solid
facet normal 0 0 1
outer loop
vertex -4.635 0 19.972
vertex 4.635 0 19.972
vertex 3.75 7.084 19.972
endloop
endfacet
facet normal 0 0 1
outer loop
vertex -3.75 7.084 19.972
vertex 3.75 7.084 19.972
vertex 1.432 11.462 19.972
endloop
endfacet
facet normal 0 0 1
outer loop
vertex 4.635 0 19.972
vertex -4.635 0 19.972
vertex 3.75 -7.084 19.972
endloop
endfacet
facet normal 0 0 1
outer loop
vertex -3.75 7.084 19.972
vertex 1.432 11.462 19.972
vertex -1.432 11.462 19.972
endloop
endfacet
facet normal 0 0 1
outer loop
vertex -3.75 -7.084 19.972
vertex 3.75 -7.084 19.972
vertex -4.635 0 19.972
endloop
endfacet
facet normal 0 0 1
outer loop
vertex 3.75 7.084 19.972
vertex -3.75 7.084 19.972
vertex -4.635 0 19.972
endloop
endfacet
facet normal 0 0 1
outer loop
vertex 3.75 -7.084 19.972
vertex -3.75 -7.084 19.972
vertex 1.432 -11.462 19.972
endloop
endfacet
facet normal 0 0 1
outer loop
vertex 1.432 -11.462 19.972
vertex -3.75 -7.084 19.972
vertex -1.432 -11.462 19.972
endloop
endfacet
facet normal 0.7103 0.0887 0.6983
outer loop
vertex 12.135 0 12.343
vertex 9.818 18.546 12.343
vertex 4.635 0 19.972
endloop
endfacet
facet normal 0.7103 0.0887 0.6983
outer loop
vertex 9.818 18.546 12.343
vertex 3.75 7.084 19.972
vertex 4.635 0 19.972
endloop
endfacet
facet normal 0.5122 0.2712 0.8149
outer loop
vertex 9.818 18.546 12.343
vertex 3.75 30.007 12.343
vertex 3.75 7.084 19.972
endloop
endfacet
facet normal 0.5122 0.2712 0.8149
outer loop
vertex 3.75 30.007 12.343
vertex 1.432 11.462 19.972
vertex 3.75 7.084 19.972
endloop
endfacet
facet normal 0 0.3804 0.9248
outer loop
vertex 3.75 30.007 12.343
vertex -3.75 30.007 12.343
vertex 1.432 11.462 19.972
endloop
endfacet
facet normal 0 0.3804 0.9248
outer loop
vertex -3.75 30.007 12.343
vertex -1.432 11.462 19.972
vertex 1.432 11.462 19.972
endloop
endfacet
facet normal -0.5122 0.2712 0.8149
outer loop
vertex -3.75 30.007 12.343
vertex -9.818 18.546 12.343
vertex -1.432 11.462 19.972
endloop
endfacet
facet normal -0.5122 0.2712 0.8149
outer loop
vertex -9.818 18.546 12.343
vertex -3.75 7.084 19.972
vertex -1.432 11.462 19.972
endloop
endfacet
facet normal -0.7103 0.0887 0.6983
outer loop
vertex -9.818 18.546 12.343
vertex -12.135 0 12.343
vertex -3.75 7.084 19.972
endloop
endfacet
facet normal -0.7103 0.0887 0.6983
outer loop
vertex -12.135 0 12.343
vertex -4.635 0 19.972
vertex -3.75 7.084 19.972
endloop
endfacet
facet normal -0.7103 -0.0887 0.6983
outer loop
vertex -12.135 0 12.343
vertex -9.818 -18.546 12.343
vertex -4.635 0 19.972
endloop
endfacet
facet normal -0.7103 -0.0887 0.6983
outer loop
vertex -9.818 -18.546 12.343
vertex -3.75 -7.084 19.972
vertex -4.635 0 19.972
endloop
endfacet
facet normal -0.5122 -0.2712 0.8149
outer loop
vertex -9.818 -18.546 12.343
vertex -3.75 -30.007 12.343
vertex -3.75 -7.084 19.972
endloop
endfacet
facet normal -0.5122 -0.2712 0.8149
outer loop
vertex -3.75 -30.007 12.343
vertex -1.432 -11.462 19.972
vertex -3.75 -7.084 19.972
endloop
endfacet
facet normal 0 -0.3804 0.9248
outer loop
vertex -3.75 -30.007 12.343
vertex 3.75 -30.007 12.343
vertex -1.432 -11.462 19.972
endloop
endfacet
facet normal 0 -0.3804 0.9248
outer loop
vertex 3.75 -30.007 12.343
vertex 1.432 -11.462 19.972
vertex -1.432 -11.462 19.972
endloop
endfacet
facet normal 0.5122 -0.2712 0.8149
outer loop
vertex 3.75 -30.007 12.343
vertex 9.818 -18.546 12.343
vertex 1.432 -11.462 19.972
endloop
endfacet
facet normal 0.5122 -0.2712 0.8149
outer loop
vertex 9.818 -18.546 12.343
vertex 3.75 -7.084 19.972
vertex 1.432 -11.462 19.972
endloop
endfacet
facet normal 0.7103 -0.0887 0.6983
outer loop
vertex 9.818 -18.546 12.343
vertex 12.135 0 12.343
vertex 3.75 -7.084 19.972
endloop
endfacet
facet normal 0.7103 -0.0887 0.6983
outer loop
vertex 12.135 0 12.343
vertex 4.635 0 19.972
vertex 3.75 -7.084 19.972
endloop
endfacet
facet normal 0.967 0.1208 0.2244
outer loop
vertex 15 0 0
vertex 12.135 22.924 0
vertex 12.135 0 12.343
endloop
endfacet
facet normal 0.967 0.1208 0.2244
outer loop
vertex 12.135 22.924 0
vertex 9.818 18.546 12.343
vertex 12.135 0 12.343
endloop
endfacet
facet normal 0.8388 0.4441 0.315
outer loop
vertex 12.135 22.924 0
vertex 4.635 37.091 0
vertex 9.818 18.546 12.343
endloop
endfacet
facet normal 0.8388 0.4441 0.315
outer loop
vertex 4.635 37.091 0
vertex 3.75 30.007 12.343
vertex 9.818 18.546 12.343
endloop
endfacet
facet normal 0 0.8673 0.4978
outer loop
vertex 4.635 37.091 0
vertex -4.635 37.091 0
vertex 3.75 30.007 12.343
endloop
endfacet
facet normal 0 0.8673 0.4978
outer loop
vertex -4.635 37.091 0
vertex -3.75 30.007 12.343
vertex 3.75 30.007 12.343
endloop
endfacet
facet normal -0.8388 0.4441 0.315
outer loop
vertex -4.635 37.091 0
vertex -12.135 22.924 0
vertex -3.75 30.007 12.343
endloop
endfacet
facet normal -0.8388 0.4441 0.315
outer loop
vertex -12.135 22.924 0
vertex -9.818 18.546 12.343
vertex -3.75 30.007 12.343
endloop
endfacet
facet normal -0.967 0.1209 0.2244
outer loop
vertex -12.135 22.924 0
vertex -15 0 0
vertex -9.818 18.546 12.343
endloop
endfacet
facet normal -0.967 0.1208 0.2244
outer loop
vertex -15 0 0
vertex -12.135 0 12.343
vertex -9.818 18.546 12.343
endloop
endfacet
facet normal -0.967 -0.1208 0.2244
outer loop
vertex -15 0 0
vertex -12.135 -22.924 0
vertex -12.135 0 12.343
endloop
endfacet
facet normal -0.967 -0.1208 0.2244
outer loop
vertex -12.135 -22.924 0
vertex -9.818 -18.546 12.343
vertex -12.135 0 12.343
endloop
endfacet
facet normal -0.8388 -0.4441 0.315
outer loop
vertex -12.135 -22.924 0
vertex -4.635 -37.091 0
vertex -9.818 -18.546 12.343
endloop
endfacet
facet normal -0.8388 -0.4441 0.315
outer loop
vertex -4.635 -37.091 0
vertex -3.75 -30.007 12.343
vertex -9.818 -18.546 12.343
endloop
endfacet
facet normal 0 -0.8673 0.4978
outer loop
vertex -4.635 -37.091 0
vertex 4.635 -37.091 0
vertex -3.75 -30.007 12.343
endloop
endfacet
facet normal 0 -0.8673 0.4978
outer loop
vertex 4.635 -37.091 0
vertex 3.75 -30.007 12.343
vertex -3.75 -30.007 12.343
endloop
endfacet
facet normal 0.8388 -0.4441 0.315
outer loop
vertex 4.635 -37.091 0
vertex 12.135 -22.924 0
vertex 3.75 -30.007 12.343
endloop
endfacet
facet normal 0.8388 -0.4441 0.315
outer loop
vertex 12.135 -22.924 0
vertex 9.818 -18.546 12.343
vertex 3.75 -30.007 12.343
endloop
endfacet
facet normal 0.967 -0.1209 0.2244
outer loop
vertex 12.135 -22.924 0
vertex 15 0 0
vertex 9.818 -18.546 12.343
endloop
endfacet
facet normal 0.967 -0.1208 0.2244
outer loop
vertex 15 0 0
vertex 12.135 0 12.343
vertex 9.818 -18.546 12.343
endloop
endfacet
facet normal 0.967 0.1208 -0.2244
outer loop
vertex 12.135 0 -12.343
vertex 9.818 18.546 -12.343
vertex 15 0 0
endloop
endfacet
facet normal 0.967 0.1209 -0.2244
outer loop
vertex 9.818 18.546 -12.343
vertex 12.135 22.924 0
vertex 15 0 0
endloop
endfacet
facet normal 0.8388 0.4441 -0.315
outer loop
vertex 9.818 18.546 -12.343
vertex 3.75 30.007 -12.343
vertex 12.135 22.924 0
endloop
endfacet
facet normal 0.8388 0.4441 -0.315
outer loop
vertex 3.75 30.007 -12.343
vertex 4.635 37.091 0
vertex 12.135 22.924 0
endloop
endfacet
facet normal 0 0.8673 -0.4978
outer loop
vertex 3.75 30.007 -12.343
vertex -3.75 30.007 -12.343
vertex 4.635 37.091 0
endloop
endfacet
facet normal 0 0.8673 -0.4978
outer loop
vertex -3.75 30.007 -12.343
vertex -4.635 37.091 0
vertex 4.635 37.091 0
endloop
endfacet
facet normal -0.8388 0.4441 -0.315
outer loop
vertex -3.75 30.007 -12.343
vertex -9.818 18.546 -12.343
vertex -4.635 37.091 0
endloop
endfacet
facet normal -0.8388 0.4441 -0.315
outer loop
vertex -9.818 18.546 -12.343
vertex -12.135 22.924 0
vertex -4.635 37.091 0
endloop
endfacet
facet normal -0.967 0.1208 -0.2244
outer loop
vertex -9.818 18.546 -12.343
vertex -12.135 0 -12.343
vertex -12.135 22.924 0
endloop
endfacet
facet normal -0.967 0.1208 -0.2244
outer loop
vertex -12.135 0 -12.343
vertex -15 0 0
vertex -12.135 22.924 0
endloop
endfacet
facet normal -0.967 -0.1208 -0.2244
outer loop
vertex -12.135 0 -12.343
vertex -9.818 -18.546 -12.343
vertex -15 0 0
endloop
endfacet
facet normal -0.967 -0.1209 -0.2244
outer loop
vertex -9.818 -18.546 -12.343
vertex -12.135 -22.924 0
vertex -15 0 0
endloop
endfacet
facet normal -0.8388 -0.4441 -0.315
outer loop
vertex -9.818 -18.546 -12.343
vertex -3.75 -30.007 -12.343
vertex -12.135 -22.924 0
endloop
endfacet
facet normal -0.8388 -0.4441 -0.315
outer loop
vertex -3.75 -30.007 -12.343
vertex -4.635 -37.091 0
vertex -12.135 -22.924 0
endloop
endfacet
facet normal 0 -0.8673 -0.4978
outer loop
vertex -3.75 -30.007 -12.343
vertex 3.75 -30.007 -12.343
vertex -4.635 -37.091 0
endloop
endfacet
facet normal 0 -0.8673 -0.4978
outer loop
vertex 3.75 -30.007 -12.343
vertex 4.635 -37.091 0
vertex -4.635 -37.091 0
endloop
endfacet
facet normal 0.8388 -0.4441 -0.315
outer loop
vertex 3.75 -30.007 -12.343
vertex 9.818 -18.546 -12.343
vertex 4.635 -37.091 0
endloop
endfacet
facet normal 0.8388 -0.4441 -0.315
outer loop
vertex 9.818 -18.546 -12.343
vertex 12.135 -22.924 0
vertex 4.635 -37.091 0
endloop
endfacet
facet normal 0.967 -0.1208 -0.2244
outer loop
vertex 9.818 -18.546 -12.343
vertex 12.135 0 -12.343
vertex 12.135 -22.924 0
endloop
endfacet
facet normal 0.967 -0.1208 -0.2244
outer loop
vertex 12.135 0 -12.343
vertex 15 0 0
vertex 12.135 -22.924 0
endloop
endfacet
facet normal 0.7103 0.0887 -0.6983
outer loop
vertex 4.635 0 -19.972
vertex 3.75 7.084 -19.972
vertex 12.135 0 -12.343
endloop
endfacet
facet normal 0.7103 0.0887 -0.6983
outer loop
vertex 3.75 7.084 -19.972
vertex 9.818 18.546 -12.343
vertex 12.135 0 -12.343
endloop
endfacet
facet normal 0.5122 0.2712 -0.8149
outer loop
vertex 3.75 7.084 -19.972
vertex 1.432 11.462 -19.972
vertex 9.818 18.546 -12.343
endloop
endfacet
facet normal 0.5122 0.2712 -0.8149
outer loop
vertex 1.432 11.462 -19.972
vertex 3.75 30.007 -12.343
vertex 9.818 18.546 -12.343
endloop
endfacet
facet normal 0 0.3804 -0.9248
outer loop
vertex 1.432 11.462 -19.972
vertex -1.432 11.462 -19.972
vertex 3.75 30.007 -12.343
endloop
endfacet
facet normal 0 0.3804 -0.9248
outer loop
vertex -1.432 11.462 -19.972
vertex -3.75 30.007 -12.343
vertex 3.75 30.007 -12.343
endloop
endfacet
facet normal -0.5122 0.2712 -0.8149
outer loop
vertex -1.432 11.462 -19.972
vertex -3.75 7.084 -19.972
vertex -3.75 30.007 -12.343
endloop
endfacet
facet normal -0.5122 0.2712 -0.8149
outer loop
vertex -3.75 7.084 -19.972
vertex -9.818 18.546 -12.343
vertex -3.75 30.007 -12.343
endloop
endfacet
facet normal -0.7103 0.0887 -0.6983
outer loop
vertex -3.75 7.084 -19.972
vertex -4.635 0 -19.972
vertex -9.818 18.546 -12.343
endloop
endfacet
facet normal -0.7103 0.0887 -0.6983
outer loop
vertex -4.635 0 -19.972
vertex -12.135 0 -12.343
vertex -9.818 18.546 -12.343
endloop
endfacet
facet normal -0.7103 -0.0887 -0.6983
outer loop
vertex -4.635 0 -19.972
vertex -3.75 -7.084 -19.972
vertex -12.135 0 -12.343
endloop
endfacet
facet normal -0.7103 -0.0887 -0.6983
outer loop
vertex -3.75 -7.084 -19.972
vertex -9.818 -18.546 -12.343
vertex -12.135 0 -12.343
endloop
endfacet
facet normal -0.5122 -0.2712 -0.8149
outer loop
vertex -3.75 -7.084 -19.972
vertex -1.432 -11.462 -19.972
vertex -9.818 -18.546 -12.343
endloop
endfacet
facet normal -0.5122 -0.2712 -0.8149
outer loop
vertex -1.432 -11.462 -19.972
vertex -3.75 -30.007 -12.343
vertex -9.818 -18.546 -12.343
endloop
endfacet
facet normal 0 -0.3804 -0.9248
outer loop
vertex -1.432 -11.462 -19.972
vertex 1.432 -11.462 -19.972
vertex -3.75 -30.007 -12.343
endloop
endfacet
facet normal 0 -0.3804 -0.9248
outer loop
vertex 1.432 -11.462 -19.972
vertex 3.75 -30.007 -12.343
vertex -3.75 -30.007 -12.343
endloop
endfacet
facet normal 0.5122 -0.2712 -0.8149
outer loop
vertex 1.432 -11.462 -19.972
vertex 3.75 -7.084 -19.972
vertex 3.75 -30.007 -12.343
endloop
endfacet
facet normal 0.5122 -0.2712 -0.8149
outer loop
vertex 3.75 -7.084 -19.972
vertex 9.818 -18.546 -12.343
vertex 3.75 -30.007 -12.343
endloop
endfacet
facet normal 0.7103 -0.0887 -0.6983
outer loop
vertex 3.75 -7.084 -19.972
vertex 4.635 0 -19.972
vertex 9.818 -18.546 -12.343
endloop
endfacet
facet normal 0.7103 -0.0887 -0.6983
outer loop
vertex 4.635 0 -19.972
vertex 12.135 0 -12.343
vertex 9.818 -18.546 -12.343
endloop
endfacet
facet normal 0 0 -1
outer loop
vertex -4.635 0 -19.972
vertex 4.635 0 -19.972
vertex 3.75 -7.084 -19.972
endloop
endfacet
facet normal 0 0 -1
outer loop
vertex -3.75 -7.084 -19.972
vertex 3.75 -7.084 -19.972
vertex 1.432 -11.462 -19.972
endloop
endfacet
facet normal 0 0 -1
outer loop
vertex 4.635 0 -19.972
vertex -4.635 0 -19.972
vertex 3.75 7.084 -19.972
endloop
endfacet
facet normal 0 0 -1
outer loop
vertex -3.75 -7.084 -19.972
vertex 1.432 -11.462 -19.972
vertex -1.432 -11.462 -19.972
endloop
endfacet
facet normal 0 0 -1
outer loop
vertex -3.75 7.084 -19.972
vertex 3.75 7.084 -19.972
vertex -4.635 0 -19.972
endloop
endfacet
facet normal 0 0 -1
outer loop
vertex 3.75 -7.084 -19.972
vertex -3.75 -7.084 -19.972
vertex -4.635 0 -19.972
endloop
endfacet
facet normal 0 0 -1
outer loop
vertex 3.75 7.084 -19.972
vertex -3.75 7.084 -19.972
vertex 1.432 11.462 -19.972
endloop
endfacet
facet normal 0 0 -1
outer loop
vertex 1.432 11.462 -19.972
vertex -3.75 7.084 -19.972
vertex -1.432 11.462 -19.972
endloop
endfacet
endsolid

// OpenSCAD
// Generated by SolidPython 1.0.1 on 2020-07-29 00:46:46


scale(v = [5, 13, 7]) {
	sphere(r = 3);
}
/***********************************************
*********      SolidPython code:      **********
************************************************
 
# import packages: SolidPython
from solid import *
from solid.utils import *
from itertools import chain, combinations, permutations


class Resize:

    def __init__(self, scad_file):
        self.scad_file = scad_file
        #self.scad_file = import_scad(scad_file)
        # cone/cylinder param:
        self.r1 = 0
        self.r2 = 0
        self.h = 0
        # rectangular prism param:
        self.w = 0
        self.l = 0
        # ellipse param:
        self.r = 0

    # import OpenScad code (file name corresponds to shape)


    # classify shape + parameters
    def assign(self, param1, param2, param3):
        if self.scad_file == 'cone.scad':
            self.r1 = param1
            self.r2 = param2
            self.h = param3
        elif self.scad_file == 'cylinder.scad':
            self.r1 = param1
            self.r2 = param2
            self.h = param3
        elif self.scad_file == 'rectangularPrism.scad':
            self.h = param1
            self.l = param2
            self.w = param3
        else:
            self.r = param1
            self.h = param2

    # resize parameters
    def iterate(self):
        x = range(3, 20, 2)
        i = 1
        if self.scad_file == 'cone.scad':
            tempList = list(permutations(x, 2))
            for temp in tempList:
                param1 = temp[0]
                param2 = temp[1]
                filepath = 'produced_scad_files/' + 'cone' + str(param1) + '_' + str(param2) + '_' + '.scad'
                scad_render_to_file(cylinder(h=param1, r1=param2, r2=0), filepath)

        elif self.scad_file == 'cylinder.scad':
            tempList = list(permutations(x, 3))
            for temp in tempList:
                param1 = temp[0]
                param2 = temp[1]
                filepath = 'produced_scad_files/' + 'cylinder' + str(param1) + '_' + str(param2) + '_' + '.scad'
                scad_render_to_file(cylinder(h=param1, r1=param2, r2=param2), filepath)

        elif self.scad_file == 'rectangularPrism.scad':
            tempList = list(permutations(x, 3))
            for temp in tempList:
                param1 = temp[0]
                param2 = temp[1]
                param3 = temp[2]
                filepath = 'produced_scad_files/' + 'rectangularPrism' + str(param1) + '_' + str(param2) + '_' + str(
                    param3) + '.scad'
                scad_render_to_file(cube(size=(param1, param2, param3)), filepath)

        elif self.scad_file == 'ellipse.scad':
            tempList = list(permutations(x, 4))
            for temp in tempList:
                param1 = temp[0]
                param2 = temp[1]
                param3 = temp[2]
                param4 = temp[3]
                filepath = 'produced_scad_files/' + 'ellipse' + str(param1) + '_' + str(param2) + '_' + str(param3) + '_' + str(param4) + '.scad'
                scad_render_to_file(scale([param1, param2, param3])(sphere(r=param4)), filepath)

    def render_to_scadfile(self):
        scad_render_to_file(scad, 'example.scad') 
 
************************************************/
